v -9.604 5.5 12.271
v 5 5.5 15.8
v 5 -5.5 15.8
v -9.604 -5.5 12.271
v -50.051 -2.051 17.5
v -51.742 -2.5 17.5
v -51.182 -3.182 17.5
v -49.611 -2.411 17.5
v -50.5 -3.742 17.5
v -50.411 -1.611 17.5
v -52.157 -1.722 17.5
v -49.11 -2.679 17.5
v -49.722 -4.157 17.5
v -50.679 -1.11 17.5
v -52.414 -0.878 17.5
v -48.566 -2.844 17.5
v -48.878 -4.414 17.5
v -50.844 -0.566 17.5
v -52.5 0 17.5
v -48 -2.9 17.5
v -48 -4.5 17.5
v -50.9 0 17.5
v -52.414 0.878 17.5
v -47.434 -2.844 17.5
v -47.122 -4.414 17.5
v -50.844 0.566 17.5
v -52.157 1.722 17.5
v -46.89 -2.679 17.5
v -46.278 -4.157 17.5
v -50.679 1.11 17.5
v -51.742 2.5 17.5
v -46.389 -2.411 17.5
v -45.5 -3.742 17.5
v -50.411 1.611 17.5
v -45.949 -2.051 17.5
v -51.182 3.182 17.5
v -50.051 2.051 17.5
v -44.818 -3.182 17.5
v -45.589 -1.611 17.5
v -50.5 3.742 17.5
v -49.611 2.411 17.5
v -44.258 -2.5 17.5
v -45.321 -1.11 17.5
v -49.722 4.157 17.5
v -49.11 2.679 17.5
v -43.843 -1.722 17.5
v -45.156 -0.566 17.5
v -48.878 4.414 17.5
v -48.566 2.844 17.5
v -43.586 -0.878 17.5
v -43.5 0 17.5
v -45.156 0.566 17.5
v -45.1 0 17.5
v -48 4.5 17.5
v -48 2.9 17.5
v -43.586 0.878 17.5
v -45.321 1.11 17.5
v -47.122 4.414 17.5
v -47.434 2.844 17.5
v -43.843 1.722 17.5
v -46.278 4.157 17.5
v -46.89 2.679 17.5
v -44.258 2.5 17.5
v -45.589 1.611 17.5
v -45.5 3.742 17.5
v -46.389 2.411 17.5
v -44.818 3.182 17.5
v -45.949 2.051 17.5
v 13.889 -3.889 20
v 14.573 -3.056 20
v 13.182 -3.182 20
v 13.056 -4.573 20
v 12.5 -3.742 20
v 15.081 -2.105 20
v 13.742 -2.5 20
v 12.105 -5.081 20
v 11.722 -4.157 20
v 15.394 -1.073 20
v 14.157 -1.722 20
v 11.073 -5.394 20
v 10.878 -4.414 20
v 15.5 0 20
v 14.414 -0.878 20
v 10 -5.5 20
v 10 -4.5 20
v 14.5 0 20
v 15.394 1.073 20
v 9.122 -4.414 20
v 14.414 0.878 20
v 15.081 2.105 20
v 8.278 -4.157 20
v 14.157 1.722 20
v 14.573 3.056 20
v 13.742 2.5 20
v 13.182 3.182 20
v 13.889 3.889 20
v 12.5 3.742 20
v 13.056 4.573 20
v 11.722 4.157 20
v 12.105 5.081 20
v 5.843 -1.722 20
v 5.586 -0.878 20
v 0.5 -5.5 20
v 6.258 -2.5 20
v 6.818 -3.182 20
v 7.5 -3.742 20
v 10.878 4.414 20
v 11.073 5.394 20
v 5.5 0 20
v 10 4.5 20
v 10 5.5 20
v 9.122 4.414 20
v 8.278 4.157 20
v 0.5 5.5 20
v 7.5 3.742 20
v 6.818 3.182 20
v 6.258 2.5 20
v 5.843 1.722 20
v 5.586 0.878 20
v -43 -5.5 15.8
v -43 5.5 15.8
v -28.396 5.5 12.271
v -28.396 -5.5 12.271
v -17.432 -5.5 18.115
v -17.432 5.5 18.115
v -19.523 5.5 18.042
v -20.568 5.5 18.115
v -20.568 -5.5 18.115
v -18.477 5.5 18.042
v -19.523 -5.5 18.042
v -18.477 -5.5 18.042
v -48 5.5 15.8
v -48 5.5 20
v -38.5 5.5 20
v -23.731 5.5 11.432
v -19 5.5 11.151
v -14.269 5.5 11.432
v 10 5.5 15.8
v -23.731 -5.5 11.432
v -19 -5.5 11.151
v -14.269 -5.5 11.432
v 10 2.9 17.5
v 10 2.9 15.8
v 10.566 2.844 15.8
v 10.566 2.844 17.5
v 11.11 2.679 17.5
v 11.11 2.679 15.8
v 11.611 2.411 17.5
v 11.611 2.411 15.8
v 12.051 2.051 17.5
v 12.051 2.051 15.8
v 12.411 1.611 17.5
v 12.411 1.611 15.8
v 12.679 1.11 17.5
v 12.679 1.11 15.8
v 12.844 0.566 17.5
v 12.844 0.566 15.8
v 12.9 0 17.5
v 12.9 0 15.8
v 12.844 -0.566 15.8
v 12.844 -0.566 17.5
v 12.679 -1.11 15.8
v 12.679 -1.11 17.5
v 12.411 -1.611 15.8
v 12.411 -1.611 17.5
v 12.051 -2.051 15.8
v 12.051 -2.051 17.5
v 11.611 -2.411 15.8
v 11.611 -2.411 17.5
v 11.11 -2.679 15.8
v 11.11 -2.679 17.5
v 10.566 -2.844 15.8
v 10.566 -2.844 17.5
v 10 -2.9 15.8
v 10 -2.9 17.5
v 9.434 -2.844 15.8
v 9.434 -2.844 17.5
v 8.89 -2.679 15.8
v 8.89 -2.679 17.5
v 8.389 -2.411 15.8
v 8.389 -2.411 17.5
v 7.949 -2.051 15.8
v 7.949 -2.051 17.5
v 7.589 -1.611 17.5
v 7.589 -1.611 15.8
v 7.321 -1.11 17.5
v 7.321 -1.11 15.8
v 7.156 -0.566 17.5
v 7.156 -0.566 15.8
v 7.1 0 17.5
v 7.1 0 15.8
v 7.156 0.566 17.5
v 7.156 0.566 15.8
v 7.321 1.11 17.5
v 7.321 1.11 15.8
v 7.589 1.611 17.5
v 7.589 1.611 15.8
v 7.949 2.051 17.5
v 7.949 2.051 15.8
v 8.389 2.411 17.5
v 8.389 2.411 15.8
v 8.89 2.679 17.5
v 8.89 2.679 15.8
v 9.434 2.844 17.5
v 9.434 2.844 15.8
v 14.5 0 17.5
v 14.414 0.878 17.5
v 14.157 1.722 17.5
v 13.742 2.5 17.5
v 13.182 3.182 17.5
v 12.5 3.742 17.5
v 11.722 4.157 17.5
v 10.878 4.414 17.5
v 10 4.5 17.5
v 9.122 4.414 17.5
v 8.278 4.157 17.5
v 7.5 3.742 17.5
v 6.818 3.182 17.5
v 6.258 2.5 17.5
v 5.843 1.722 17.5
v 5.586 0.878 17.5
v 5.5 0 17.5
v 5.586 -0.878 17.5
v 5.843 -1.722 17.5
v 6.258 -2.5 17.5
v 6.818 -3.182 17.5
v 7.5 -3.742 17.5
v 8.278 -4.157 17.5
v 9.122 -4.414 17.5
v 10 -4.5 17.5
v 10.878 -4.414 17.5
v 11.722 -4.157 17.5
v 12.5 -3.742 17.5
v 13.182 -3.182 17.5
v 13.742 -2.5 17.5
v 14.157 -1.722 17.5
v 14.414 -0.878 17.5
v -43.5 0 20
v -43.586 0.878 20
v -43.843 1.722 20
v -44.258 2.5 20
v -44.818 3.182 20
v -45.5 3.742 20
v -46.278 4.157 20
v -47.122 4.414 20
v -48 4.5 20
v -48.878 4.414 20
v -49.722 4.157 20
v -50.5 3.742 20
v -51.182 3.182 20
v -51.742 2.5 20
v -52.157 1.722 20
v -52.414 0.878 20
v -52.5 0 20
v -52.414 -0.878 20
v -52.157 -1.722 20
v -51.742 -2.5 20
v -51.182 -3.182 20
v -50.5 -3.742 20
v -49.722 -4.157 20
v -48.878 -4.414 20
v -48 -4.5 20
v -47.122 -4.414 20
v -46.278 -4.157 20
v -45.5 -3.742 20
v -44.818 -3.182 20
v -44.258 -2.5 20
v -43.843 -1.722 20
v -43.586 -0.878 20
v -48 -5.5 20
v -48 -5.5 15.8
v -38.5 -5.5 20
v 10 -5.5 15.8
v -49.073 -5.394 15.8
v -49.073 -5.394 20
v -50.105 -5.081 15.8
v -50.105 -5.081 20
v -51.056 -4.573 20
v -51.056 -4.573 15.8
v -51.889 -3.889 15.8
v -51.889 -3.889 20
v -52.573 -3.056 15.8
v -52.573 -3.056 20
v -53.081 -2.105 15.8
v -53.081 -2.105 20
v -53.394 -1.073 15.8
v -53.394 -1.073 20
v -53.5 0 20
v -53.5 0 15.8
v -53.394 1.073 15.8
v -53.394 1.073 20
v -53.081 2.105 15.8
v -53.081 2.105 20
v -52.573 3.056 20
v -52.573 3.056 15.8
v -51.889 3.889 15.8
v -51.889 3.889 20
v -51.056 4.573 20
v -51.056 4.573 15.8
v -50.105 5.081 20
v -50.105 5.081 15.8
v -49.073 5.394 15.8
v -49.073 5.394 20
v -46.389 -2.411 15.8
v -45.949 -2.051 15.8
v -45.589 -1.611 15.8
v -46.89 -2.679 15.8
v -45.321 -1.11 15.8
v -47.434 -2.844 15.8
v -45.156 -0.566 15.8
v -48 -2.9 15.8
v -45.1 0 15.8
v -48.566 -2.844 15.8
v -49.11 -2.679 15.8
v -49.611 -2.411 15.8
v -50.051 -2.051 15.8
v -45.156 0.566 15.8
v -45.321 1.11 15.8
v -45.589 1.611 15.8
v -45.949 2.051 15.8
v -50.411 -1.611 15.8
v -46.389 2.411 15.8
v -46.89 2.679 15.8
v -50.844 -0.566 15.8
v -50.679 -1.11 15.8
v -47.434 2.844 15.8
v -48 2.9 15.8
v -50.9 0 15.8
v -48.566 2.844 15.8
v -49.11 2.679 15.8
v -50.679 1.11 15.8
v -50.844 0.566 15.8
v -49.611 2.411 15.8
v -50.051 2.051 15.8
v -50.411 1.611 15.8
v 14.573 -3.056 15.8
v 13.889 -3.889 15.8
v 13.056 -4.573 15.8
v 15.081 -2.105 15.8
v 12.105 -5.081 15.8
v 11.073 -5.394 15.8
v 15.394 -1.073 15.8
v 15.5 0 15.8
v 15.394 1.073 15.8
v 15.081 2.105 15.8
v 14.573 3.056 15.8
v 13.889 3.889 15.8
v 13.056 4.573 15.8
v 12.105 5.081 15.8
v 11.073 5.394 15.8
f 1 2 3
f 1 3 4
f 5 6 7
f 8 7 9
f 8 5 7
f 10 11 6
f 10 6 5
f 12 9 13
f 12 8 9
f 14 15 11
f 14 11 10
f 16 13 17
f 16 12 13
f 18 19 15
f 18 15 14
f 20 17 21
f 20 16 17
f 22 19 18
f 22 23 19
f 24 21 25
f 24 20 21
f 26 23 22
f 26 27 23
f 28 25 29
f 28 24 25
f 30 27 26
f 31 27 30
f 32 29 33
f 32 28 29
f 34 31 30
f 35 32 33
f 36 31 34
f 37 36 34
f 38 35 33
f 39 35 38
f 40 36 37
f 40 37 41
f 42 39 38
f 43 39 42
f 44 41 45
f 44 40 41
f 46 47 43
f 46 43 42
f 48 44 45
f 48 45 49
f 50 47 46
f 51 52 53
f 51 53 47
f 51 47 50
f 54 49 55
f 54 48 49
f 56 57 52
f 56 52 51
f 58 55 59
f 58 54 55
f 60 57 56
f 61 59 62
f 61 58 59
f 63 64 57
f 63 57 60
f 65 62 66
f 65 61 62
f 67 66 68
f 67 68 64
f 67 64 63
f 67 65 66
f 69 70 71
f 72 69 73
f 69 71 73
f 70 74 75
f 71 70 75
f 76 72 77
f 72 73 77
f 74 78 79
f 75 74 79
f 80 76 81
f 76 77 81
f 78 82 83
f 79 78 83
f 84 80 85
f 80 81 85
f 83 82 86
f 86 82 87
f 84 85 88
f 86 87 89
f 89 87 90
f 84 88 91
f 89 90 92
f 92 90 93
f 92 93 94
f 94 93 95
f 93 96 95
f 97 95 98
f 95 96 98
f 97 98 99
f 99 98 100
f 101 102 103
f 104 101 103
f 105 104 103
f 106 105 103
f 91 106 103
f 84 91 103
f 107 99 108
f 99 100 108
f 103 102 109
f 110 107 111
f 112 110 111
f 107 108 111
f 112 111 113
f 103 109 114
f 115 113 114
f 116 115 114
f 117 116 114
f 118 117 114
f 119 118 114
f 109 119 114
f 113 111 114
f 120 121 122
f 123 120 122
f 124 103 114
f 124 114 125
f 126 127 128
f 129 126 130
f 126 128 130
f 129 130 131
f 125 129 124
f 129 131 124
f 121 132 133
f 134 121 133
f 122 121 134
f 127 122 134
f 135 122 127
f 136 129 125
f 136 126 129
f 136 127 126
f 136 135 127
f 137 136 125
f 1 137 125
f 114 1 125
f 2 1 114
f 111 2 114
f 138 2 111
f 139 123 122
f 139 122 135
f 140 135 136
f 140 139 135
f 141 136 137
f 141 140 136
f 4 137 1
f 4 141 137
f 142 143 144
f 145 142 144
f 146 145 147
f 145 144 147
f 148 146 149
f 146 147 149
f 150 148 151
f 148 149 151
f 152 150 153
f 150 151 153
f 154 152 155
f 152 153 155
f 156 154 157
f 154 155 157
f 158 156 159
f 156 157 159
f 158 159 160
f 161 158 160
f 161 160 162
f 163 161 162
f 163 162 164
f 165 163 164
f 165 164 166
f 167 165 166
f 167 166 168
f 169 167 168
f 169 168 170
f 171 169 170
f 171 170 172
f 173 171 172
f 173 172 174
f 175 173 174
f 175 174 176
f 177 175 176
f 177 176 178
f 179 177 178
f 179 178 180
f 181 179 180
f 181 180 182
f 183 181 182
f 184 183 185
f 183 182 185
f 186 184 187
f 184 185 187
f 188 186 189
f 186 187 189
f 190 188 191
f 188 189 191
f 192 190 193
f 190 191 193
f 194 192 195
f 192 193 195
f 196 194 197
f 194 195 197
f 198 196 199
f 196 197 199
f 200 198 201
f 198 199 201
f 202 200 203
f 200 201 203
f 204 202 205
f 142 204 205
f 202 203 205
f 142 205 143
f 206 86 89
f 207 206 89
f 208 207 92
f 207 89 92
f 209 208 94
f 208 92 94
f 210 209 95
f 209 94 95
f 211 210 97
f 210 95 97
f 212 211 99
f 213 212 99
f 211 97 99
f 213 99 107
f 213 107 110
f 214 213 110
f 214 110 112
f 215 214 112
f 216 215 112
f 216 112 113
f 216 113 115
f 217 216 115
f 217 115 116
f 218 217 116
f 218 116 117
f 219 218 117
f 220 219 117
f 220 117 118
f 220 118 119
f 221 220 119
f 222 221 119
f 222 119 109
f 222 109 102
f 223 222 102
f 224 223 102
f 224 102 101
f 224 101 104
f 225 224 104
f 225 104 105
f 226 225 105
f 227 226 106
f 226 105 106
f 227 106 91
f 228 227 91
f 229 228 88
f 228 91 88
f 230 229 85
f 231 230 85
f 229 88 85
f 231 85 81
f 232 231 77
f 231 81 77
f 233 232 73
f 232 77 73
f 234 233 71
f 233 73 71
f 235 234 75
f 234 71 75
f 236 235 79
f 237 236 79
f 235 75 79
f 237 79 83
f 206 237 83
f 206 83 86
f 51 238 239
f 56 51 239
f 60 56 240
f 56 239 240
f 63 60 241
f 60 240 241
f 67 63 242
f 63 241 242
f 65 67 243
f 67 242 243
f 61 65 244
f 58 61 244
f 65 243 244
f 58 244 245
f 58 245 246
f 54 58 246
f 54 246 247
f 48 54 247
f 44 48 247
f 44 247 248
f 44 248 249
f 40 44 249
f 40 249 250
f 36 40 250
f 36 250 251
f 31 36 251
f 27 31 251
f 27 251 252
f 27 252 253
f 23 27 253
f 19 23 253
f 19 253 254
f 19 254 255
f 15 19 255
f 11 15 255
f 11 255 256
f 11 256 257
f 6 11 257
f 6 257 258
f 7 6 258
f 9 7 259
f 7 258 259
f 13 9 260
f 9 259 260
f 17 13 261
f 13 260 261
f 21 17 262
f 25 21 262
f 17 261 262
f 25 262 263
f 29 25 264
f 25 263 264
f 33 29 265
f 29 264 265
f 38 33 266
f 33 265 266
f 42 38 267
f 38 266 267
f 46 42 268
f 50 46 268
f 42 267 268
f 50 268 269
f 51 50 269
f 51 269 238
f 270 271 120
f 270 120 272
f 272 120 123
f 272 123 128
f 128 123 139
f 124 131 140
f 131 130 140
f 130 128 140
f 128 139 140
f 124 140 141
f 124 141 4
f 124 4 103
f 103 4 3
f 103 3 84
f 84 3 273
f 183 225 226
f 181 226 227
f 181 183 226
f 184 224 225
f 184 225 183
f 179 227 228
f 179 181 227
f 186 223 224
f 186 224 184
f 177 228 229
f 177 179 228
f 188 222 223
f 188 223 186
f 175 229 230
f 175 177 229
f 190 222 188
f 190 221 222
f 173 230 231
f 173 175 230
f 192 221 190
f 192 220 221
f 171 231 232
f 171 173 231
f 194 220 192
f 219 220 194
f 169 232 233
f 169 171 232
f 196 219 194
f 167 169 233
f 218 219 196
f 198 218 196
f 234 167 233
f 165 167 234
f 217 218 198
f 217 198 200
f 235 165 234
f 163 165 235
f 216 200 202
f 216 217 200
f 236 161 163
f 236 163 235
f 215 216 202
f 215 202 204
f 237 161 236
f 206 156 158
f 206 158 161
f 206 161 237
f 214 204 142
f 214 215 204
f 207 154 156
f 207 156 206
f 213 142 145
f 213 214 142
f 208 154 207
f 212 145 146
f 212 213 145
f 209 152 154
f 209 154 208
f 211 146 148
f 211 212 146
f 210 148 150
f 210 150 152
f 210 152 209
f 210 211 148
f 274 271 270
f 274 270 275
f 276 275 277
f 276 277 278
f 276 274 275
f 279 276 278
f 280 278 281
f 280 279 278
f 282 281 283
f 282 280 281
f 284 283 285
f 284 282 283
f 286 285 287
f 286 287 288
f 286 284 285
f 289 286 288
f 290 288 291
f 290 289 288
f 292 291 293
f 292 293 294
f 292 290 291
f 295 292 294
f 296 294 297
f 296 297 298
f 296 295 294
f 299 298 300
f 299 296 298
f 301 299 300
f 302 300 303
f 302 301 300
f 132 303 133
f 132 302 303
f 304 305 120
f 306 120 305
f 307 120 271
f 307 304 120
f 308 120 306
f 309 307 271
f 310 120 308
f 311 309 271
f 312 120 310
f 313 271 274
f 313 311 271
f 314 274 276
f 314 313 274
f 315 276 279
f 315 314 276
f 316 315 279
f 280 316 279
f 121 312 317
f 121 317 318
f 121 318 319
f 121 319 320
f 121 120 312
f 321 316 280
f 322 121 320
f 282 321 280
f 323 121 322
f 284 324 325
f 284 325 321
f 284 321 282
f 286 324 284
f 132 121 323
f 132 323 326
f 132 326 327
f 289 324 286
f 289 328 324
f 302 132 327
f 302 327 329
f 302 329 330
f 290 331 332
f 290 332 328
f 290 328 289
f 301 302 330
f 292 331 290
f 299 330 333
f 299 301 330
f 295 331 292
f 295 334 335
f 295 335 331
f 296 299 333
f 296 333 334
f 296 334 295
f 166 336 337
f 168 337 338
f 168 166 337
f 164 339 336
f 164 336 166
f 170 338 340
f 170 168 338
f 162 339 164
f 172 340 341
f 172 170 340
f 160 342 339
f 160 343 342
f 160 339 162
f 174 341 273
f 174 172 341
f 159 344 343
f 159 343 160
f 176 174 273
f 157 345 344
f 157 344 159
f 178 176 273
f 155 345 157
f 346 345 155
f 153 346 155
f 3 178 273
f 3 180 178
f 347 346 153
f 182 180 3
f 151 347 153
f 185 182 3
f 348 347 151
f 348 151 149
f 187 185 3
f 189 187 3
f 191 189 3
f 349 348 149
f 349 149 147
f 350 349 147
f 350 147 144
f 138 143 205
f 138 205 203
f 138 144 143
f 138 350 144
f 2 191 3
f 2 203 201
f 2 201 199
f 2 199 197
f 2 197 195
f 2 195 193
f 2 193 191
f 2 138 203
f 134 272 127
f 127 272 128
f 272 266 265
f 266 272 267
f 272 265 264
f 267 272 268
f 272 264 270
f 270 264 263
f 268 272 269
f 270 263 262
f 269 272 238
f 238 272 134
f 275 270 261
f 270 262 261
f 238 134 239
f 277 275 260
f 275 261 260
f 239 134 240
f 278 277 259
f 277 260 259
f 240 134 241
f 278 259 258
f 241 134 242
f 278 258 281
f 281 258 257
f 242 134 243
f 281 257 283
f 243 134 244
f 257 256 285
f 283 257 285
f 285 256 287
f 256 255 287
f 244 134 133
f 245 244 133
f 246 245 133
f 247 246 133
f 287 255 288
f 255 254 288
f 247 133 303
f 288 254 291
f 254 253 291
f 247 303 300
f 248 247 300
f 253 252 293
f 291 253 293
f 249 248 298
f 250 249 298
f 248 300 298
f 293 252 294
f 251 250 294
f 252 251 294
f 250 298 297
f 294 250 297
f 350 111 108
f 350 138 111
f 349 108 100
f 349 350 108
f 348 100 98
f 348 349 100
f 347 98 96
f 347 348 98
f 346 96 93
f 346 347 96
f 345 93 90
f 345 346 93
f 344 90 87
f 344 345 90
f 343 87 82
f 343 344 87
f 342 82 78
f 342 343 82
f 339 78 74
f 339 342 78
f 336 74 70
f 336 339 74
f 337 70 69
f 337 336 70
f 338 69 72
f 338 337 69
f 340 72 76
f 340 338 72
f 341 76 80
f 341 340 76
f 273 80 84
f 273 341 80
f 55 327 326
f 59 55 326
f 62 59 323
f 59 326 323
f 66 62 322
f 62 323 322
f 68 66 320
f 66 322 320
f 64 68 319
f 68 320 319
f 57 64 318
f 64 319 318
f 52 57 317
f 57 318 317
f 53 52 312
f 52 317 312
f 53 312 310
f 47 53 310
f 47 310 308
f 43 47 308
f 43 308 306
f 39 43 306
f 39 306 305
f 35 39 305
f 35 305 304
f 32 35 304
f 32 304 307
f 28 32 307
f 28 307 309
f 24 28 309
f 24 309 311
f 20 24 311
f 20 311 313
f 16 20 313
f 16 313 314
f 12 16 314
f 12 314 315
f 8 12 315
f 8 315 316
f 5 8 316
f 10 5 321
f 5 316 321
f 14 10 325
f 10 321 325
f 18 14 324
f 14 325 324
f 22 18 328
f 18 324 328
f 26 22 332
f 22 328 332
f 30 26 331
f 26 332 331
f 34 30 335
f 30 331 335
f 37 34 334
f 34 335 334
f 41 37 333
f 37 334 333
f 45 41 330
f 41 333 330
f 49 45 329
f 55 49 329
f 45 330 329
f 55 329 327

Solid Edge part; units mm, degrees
sketch "Sketch1" plane through (0, 0, 0) normal (0, 0, 1) x (1, 0, 0)
  line L0 (-48, 5.5) -> (10, 5.5)
  line L1 (-48, -5.5) -> (10, -5.5)
  arc A0 (-48, -5.5) -> (-48, 5.5) centre (-48, 0) cw
  arc A1 (10, 5.5) -> (10, -5.5) centre (10, 0) cw
extrude "Protrusion1" add sketch "Sketch1" along normal blind 20
sketch "Sketch2" plane through (0, 0, 20) normal (0, 0, 1) x (1, 0, 0)
  circle A0 centre (-48, 0) radius 4.5
  dimension "D1" = 9
extrude "Extrusionsausschnitt_1" cut sketch "Sketch2" against normal blind 2.5
sketch "Sketch3" plane through (0, 0, 20) normal (0, 0, 1) x (1, 0, 0)
  circle A0 centre (10, 0) radius 4.5
extrude "Extrusionsausschnitt_2" cut sketch "Sketch3" against normal blind 2.5
sketch "Sketch4" plane through (0, 0, 0) normal (0, -1, 0) x (1, 0, 0)
  line L0 (-38.5, 20) -> (-19, 17.9505)
  line L1 (0.5, 20) -> (-19, 17.9505)
  dimension "D1" = 15
  dimension "D2" = 15
extrude "Cutout1" cut sketch "Sketch4" along normal up to next and the other way up to next material side at (-28.7448, 0, 19.025)
sketch "Sketch5" plane through (0, 0, 0) normal (0, -1, 0) x (1, 0, 0)
  line L0 (59.3337, 10) -> (65.9133, -0.3822)
  line L1 (-60.6663, 10) -> (59.3337, 10)
  line L2 (-60.6663, 10) -> (-66.4669, -5.8923)
  dimension "D1" = 10
  dimension "D2" = 120
extrude "Cutout2" cut sketch "Sketch5" along normal up to next and the other way up to next material side at (62.5813, 0, 4.7821)
hole "Bohrung_1" at (-48, 0, 10) direction (0, 0, 1) diameter 5.8 end up to next counterbore diameter 10 counterbore depth 5.8
hole "Hole1" at (10, 0, 10) direction (0, 0, 1) diameter 5.8 end up to next counterbore diameter 10 counterbore depth 5.8
sketch "Sketch6" plane through (0, 5.5, 15) normal (0, 1, 0) x (1, 0, 0)
  line L0 (5, -0.8) -> (-19, 5)
  line L1 (15.5, -0.8) -> (5, -0.8)
  line L2 (43.1446, 3.1504) -> (15.5, -0.8)
  line L3 (11.6347, 27.0505) -> (43.1446, 3.1504)
  line L4 (-73.2169, -0.8) -> (11.6347, 27.0505)
  line L5 (-43, -0.8) -> (-73.2169, -0.8)
  line L6 (-43, -0.8) -> (-19, 5)
  dimension "D1" = 10.5
  dimension "D2" = 10.5
  dimension "D3" = 24.6909
  dimension "D4" = 24.6909
extrude "Cutout3" cut sketch "Sketch6" against normal up to next
fillet "Verrundung_2" radius 40 1 edges at (-19, 0, 10)
fillet "Verrundung_3" radius 15 1 edges at (-19, 0, 17.9505)
properties part number "25" material "Polykarbonat"
